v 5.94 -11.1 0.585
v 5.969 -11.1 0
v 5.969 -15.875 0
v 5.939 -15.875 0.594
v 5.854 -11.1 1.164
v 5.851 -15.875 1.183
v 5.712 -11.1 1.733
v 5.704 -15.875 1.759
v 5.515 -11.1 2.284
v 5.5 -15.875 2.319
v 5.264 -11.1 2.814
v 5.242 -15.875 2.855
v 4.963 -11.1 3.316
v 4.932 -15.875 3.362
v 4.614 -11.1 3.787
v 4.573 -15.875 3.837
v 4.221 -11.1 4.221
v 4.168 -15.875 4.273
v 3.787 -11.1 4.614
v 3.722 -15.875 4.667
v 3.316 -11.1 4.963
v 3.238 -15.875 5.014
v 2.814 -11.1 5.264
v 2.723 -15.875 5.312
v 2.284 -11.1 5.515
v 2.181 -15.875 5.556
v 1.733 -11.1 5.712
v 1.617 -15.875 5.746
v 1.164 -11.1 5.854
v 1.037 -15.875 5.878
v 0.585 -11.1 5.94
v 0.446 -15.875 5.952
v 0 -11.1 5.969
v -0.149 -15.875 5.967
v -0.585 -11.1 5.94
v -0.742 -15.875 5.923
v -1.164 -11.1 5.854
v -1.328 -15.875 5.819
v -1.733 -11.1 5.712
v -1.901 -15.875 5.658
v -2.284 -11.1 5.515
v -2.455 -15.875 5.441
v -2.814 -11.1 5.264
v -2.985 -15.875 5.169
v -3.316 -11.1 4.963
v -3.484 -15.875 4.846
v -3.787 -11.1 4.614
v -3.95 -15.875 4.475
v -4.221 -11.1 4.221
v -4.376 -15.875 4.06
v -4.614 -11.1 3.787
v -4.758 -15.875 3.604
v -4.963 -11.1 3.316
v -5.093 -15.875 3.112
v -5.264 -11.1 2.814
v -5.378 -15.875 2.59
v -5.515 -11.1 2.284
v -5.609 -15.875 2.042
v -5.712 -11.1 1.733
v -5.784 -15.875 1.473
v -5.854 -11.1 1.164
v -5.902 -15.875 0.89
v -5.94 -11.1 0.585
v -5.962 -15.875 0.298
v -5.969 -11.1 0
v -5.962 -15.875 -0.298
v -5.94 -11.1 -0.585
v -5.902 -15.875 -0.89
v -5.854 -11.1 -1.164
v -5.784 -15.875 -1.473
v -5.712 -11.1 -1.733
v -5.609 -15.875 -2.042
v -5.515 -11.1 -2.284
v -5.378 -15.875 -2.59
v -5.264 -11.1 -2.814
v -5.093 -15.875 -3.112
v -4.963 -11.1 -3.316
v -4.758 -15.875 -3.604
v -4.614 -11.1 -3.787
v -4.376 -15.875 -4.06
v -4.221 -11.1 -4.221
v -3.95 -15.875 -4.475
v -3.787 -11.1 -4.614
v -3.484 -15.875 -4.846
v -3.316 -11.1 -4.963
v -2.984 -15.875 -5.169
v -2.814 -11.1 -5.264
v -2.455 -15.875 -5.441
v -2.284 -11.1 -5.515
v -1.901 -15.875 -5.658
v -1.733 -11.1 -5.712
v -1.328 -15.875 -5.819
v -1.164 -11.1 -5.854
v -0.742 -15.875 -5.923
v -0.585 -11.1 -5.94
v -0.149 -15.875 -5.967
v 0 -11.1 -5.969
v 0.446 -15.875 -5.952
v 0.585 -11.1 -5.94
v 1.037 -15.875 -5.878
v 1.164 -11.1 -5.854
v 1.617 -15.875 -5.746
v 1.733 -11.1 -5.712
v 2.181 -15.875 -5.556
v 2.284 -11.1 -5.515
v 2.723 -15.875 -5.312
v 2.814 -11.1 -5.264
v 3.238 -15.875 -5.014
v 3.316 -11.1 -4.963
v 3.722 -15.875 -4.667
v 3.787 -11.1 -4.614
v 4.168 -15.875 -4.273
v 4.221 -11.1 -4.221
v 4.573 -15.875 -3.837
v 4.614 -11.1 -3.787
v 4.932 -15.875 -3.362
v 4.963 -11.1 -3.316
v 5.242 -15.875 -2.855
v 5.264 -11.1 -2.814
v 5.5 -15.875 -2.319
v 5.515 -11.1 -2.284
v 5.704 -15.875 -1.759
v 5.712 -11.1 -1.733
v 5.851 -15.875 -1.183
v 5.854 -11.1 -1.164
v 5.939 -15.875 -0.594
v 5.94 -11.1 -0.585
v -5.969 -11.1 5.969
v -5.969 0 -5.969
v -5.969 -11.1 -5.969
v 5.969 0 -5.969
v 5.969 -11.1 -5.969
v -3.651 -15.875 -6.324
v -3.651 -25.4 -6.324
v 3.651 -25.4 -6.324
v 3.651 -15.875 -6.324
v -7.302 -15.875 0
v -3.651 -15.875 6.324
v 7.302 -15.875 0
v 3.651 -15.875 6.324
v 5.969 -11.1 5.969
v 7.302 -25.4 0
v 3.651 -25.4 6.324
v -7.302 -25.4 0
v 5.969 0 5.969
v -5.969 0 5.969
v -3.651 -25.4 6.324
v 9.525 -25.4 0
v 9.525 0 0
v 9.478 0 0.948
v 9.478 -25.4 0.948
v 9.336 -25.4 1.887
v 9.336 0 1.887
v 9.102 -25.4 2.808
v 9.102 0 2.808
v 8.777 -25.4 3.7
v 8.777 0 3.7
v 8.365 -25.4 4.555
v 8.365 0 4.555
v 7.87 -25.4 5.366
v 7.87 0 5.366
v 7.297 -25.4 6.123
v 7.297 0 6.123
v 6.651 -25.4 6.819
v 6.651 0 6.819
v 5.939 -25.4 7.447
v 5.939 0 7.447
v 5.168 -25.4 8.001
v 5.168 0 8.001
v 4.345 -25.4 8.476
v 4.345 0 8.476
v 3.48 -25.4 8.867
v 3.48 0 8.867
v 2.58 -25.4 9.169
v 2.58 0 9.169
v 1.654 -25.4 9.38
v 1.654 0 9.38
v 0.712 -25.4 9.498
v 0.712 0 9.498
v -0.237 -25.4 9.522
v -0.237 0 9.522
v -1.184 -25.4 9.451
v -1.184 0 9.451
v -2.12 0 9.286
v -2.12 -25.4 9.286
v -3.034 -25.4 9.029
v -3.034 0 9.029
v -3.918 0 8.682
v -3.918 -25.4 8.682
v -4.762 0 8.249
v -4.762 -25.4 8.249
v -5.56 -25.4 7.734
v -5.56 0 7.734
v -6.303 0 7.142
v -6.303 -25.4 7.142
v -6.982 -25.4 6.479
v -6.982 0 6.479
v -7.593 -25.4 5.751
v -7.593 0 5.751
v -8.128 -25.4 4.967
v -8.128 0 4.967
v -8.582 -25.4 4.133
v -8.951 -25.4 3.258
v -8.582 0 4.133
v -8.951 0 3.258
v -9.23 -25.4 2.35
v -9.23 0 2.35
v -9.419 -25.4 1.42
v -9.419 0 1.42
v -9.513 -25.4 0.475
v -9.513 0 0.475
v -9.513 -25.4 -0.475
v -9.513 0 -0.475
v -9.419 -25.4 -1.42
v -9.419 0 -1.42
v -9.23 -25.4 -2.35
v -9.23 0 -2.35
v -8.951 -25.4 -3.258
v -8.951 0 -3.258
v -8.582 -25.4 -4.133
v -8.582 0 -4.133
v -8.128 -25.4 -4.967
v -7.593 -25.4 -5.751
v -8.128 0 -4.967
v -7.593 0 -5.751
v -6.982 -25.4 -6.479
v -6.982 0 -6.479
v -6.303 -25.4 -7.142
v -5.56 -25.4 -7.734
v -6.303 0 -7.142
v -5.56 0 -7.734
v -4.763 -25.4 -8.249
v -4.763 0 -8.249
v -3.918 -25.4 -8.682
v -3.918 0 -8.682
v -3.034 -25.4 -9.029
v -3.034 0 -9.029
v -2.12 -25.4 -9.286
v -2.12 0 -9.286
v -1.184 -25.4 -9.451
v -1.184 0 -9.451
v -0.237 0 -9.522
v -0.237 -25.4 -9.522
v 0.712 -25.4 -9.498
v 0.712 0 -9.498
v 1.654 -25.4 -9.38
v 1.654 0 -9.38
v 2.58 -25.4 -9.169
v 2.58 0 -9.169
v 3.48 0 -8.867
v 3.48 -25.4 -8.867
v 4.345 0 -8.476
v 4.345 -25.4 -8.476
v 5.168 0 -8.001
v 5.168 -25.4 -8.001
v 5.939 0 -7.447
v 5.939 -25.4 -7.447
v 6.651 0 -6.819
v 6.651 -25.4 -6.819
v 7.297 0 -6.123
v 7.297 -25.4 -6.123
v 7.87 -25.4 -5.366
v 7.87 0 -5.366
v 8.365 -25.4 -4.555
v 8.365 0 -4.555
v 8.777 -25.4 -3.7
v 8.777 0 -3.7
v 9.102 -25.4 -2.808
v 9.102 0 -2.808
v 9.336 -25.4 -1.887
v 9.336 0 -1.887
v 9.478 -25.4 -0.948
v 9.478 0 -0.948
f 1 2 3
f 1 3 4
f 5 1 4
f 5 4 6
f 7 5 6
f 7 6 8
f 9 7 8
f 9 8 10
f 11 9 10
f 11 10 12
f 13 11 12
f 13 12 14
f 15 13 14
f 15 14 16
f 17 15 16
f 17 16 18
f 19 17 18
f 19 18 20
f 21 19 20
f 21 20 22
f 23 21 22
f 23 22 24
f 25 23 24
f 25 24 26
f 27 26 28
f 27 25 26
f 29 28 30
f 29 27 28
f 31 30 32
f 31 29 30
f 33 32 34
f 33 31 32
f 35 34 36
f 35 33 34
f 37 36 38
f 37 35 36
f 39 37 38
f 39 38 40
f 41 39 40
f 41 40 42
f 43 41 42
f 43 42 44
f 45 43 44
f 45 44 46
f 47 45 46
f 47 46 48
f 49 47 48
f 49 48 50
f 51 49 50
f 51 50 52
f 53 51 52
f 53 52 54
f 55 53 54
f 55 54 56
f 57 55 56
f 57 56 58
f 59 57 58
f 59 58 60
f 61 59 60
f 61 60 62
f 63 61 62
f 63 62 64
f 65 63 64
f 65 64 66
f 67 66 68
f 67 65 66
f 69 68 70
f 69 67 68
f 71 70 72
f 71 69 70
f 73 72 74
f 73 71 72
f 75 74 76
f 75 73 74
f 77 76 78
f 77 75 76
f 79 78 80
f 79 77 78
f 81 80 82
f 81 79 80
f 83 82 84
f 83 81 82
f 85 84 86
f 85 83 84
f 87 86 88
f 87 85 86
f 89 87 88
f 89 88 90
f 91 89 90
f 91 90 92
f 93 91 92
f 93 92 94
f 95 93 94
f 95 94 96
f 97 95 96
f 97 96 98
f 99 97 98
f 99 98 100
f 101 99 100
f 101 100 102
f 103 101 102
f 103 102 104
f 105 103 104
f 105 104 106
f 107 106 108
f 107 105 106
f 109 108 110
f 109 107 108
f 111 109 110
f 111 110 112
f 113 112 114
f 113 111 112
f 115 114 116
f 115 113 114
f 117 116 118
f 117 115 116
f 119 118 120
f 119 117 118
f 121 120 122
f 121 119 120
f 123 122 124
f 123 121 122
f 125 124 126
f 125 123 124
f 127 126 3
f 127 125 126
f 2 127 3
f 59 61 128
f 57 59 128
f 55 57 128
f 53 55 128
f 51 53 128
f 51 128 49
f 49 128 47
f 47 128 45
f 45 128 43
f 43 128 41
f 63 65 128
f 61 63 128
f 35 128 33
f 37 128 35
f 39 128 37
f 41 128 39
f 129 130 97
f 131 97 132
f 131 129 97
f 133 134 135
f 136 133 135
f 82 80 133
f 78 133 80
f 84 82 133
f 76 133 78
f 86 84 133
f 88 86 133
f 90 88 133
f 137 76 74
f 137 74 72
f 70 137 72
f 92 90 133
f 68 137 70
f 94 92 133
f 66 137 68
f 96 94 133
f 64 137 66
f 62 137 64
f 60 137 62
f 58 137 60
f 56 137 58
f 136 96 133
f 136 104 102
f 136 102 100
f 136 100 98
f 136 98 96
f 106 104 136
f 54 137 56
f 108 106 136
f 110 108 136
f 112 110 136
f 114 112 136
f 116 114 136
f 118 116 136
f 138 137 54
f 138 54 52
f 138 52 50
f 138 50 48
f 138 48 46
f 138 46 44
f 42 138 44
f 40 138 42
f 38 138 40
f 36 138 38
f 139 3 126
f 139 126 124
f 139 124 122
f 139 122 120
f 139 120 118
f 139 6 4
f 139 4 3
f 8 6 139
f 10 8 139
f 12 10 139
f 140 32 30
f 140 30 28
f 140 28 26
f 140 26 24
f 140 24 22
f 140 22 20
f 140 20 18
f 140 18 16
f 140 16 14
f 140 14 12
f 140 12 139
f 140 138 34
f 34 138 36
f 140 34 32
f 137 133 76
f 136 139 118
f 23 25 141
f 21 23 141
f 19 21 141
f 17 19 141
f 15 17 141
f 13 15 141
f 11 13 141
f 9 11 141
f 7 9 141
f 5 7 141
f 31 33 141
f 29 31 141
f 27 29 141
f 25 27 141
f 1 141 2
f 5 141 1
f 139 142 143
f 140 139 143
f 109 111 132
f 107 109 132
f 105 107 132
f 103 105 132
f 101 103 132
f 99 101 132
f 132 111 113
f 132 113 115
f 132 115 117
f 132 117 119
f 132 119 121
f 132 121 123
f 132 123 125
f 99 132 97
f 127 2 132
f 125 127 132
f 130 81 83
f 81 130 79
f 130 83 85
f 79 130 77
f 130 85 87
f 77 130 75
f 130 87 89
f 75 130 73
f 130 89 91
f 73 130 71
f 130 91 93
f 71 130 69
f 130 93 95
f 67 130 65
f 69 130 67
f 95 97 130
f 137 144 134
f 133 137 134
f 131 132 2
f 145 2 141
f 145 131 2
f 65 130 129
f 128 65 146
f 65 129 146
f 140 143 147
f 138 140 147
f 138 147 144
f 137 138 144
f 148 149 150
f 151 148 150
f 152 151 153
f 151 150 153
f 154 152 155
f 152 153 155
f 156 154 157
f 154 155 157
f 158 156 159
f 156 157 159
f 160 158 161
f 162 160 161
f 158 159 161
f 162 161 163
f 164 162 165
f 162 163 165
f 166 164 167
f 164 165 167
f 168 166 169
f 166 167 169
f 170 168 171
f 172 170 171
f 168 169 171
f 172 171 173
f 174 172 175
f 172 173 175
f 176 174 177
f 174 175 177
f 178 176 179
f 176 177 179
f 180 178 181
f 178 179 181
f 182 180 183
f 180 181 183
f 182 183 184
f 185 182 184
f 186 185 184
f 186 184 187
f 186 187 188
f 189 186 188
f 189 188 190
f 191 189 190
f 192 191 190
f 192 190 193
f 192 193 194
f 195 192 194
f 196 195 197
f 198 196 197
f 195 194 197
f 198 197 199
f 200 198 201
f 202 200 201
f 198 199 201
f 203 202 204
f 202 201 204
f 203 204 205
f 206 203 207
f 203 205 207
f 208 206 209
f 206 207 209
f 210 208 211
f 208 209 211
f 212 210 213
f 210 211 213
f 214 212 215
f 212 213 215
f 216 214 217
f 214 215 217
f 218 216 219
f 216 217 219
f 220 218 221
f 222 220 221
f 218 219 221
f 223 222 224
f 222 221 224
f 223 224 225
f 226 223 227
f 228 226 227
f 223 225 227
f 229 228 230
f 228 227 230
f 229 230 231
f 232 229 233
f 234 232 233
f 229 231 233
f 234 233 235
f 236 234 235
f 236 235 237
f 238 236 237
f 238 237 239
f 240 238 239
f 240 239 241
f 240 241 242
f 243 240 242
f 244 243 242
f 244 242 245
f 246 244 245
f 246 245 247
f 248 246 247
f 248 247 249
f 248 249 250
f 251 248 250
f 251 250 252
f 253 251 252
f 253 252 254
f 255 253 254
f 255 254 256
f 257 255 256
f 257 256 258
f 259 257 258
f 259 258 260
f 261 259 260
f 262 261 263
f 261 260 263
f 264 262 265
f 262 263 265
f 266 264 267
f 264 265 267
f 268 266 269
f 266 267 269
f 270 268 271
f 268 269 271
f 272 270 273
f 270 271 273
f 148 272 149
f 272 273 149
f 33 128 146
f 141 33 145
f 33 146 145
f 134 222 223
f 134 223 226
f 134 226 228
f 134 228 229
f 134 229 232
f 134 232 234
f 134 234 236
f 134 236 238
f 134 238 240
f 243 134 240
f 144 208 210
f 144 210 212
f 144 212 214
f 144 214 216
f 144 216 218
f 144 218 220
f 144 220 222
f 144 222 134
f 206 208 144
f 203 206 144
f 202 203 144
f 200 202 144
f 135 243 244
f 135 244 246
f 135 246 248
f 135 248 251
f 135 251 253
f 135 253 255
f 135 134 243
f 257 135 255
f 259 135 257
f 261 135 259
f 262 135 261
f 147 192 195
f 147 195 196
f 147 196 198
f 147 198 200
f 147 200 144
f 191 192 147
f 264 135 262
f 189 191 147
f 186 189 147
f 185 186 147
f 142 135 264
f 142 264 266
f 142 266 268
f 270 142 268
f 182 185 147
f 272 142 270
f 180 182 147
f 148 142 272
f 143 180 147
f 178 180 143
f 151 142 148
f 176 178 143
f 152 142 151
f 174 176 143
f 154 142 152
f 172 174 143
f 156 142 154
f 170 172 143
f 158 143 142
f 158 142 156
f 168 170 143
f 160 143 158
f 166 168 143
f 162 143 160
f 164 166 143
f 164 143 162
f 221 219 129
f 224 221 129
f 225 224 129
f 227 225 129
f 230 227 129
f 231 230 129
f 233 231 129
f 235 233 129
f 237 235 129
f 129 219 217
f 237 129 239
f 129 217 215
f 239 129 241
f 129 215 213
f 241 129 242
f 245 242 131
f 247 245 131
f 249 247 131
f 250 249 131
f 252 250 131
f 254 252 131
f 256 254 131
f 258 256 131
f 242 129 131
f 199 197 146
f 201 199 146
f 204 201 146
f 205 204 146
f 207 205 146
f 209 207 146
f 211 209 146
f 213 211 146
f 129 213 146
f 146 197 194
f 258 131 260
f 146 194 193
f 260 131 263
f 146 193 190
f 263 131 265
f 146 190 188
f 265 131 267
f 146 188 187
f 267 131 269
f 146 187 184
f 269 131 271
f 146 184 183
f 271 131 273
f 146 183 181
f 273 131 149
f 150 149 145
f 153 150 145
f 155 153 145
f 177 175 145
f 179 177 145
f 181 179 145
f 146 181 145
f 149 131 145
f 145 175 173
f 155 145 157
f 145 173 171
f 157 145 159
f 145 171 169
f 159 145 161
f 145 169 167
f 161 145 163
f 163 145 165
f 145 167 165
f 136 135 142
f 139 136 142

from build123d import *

# Parameters (mm, degrees)
F0_R     = 9.525
F1_DEPTH = 25.4
F3_R     = 5.969
F4_DEPTH = 25.401
F2_W     = 11.938
F2_H     = 11.938
F5_DEPTH = 11.0998
F7_DEPTH = 9.525


with BuildPart() as f1:
    # F0 (on Front) → F1 (new body)
    with BuildSketch(Plane.XZ):
        Circle(F0_R)
    extrude(amount=F1_DEPTH)

    # F3 (on Front) → F4 (cut, through all)
    with BuildSketch(Plane.XZ):
        Circle(F3_R)
    extrude(amount=F4_DEPTH, mode=Mode.SUBTRACT)

    # F2 (on Front) → F5 (cut)
    with BuildSketch(Plane.XZ):
        Rectangle(F2_W, F2_H)
    extrude(amount=F5_DEPTH, mode=Mode.SUBTRACT)

    # F6 (on face) → F7 (cut)
    with BuildSketch(Plane.XZ.offset(25.4)):
        Polygon((3.65125, 6.324151), (-3.65125, 6.324151), (-7.3025, 0), (-3.65125, -6.324151), (3.65125, -6.324151), (7.3025, 0), align=None)
    extrude(amount=-F7_DEPTH, mode=Mode.SUBTRACT)


solid = f1.part
